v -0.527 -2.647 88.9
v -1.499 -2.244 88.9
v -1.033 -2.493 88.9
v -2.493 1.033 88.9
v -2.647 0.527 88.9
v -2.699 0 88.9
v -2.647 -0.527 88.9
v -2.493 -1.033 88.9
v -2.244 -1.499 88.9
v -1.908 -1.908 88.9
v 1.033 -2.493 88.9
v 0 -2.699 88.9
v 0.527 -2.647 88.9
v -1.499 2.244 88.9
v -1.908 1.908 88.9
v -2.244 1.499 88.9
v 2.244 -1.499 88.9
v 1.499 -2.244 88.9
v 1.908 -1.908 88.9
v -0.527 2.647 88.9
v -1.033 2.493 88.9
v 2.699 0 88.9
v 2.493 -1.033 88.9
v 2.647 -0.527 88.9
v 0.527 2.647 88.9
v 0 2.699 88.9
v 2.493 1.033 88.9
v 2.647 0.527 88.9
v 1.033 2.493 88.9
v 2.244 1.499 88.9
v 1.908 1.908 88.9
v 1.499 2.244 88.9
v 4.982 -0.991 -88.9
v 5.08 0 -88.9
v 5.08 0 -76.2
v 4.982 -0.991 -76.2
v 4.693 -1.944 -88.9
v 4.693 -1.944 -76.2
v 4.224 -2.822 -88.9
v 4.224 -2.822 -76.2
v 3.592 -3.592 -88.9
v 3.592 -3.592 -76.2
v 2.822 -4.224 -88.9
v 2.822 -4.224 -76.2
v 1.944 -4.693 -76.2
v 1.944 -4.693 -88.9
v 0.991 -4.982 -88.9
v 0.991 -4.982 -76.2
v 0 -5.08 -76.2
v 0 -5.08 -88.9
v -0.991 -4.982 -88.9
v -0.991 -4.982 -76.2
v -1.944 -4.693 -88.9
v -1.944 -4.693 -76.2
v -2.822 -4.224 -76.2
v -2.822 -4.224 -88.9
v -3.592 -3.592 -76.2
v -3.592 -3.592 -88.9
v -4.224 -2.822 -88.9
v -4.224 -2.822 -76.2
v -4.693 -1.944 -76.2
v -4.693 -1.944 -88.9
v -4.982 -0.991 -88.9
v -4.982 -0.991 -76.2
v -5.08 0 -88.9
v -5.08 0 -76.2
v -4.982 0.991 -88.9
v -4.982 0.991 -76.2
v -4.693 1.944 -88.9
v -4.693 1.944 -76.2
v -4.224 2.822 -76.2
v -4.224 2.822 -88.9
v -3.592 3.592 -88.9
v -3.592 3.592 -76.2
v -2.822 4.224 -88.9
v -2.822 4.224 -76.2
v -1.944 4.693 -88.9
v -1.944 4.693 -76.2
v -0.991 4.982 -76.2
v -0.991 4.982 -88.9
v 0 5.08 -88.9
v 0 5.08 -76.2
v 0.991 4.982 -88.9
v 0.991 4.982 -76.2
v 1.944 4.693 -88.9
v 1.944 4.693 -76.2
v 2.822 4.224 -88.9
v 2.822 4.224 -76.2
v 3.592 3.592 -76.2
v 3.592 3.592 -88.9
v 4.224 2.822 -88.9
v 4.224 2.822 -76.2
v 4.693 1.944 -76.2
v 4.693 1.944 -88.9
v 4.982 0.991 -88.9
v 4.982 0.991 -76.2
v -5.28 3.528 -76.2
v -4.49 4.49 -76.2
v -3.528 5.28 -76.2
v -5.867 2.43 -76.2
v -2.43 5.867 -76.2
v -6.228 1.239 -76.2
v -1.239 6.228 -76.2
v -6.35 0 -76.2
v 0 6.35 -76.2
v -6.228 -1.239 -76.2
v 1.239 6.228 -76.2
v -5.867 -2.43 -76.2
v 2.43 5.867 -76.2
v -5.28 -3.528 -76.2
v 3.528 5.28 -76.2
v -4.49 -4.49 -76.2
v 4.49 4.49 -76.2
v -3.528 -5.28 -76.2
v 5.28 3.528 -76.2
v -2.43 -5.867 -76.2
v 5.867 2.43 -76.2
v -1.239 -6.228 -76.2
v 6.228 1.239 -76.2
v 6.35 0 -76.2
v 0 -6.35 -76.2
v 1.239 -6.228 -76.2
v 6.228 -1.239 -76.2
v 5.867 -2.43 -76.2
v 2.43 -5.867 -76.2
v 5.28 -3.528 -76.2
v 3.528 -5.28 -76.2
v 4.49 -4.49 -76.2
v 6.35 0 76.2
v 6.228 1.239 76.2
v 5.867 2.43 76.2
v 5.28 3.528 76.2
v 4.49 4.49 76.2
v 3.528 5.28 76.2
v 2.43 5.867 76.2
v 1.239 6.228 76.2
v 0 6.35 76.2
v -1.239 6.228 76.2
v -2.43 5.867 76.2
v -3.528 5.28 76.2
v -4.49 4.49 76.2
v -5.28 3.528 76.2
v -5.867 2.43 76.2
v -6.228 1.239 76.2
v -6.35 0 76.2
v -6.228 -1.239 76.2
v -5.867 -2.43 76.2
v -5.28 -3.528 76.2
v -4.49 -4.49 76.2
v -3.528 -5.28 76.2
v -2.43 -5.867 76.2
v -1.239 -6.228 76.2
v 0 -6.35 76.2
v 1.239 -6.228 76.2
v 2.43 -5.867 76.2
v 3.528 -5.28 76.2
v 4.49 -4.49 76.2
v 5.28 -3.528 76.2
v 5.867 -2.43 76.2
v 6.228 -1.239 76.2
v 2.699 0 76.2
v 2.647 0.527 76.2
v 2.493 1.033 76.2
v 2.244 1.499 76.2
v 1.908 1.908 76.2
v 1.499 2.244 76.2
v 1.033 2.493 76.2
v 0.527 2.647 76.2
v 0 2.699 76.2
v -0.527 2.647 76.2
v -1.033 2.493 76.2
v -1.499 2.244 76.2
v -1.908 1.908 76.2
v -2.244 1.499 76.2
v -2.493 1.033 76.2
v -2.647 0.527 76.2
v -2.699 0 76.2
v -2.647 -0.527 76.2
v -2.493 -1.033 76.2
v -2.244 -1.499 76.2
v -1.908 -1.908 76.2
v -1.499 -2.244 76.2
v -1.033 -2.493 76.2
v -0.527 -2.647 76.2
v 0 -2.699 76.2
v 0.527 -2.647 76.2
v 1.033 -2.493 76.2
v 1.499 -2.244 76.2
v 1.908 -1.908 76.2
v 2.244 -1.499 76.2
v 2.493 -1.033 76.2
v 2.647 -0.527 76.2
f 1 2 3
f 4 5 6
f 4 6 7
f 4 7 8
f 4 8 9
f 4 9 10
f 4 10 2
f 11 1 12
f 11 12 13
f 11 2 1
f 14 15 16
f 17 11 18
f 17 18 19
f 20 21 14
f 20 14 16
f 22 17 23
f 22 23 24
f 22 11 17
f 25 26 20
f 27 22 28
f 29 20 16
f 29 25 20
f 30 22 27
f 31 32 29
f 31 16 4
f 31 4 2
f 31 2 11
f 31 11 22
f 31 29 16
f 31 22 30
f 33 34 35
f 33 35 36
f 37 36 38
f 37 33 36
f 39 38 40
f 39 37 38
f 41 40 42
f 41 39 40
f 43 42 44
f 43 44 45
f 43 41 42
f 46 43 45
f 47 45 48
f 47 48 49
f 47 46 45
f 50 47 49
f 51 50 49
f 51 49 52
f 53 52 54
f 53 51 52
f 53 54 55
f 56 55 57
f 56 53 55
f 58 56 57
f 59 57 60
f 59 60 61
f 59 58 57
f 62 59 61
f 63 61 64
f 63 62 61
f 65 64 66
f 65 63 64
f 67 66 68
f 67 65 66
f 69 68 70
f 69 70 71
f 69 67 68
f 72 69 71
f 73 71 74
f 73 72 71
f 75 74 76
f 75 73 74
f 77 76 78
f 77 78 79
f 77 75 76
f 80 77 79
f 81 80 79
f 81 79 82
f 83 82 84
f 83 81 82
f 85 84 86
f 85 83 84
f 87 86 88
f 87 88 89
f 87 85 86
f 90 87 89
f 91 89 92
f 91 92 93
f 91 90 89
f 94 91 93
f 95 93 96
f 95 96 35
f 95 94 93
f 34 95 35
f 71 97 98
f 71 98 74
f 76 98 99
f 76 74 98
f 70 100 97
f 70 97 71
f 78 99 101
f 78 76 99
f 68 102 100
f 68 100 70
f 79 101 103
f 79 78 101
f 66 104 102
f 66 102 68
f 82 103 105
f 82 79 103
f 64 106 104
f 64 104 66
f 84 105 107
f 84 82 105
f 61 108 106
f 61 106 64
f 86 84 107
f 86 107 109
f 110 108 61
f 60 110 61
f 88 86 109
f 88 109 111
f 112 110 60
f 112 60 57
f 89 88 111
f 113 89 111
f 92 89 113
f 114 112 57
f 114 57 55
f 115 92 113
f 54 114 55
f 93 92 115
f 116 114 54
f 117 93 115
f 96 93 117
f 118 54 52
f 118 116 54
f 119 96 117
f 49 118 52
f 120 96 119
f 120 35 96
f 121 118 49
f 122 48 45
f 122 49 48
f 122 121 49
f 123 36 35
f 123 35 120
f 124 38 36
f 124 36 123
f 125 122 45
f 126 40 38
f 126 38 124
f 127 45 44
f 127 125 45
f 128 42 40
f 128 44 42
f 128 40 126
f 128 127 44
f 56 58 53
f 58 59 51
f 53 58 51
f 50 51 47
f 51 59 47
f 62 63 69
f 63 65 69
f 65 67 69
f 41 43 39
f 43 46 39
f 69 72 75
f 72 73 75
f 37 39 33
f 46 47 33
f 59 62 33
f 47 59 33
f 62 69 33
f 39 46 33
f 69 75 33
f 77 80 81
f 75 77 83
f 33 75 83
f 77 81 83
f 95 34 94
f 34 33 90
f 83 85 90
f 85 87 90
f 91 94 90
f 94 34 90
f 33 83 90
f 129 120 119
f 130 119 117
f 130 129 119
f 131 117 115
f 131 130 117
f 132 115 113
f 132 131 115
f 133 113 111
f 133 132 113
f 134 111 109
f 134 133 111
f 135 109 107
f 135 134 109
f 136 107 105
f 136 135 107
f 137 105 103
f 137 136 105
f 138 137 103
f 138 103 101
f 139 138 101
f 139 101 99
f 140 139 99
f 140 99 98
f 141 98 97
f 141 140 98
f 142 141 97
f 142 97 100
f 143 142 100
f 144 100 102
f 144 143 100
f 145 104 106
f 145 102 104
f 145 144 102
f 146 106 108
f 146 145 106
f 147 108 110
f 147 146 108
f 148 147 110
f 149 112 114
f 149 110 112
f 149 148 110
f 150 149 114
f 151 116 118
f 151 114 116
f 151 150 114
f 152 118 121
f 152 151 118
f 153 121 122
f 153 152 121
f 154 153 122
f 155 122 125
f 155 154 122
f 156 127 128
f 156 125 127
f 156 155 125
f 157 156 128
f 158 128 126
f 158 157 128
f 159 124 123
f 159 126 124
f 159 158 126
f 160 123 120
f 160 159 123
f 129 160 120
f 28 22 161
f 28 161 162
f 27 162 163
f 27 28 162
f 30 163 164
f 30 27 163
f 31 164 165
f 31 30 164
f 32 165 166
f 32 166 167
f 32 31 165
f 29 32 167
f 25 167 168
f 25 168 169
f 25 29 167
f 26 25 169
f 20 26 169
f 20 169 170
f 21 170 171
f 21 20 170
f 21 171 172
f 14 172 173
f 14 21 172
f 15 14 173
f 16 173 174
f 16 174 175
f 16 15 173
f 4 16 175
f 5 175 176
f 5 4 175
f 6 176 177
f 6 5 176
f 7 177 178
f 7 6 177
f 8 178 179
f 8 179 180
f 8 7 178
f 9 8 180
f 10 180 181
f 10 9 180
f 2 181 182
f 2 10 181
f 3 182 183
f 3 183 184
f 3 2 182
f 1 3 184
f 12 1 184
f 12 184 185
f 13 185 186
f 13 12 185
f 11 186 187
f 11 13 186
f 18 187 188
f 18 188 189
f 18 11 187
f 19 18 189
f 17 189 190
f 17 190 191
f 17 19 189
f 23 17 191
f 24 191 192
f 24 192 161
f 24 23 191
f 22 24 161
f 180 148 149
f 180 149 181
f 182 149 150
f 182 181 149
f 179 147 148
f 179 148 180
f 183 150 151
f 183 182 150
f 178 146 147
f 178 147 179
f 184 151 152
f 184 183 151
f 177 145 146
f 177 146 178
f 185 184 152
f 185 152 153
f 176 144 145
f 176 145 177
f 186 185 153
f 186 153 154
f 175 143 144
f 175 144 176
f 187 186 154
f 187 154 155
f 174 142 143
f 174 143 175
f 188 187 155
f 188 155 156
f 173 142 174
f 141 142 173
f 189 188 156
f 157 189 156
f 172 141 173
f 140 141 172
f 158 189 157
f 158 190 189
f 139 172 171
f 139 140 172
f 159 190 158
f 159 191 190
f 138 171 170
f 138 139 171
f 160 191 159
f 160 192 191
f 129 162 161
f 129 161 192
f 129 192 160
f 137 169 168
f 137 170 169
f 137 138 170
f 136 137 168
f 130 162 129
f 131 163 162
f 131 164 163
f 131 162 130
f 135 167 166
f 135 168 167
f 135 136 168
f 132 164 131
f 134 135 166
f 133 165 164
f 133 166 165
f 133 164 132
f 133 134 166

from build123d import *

# Parameters (mm, degrees)
F0_R     = 6.35
F1_DEPTH = 88.9
F2_R     = 6.35
F2_R_2   = 2.69875
F3_DEPTH = 12.7
F4_R     = 6.35
F4_R_2   = 5.08
F5_DEPTH = 12.7


with BuildPart() as f1:
    # F0 (on Top) → F1 (new body, symmetric)
    with BuildSketch(Plane.XY):
        Circle(F0_R)
    extrude(amount=F1_DEPTH, both=True)

    # F2 (on face) → F3 (cut)
    with BuildSketch(Plane.XY.offset(88.9)):
        Circle(F2_R)
        Circle(F2_R_2, mode=Mode.SUBTRACT)
    extrude(amount=-F3_DEPTH, mode=Mode.SUBTRACT)

    # F4 (on face) → F5 (cut)
    with BuildSketch(Plane(origin=(0, 0, -88.9), x_dir=(1, 0, 0), z_dir=(0, 0, -1))):
        Circle(F4_R)
        Circle(F4_R_2, mode=Mode.SUBTRACT)
    extrude(amount=-F5_DEPTH, mode=Mode.SUBTRACT)


solid = f1.part
